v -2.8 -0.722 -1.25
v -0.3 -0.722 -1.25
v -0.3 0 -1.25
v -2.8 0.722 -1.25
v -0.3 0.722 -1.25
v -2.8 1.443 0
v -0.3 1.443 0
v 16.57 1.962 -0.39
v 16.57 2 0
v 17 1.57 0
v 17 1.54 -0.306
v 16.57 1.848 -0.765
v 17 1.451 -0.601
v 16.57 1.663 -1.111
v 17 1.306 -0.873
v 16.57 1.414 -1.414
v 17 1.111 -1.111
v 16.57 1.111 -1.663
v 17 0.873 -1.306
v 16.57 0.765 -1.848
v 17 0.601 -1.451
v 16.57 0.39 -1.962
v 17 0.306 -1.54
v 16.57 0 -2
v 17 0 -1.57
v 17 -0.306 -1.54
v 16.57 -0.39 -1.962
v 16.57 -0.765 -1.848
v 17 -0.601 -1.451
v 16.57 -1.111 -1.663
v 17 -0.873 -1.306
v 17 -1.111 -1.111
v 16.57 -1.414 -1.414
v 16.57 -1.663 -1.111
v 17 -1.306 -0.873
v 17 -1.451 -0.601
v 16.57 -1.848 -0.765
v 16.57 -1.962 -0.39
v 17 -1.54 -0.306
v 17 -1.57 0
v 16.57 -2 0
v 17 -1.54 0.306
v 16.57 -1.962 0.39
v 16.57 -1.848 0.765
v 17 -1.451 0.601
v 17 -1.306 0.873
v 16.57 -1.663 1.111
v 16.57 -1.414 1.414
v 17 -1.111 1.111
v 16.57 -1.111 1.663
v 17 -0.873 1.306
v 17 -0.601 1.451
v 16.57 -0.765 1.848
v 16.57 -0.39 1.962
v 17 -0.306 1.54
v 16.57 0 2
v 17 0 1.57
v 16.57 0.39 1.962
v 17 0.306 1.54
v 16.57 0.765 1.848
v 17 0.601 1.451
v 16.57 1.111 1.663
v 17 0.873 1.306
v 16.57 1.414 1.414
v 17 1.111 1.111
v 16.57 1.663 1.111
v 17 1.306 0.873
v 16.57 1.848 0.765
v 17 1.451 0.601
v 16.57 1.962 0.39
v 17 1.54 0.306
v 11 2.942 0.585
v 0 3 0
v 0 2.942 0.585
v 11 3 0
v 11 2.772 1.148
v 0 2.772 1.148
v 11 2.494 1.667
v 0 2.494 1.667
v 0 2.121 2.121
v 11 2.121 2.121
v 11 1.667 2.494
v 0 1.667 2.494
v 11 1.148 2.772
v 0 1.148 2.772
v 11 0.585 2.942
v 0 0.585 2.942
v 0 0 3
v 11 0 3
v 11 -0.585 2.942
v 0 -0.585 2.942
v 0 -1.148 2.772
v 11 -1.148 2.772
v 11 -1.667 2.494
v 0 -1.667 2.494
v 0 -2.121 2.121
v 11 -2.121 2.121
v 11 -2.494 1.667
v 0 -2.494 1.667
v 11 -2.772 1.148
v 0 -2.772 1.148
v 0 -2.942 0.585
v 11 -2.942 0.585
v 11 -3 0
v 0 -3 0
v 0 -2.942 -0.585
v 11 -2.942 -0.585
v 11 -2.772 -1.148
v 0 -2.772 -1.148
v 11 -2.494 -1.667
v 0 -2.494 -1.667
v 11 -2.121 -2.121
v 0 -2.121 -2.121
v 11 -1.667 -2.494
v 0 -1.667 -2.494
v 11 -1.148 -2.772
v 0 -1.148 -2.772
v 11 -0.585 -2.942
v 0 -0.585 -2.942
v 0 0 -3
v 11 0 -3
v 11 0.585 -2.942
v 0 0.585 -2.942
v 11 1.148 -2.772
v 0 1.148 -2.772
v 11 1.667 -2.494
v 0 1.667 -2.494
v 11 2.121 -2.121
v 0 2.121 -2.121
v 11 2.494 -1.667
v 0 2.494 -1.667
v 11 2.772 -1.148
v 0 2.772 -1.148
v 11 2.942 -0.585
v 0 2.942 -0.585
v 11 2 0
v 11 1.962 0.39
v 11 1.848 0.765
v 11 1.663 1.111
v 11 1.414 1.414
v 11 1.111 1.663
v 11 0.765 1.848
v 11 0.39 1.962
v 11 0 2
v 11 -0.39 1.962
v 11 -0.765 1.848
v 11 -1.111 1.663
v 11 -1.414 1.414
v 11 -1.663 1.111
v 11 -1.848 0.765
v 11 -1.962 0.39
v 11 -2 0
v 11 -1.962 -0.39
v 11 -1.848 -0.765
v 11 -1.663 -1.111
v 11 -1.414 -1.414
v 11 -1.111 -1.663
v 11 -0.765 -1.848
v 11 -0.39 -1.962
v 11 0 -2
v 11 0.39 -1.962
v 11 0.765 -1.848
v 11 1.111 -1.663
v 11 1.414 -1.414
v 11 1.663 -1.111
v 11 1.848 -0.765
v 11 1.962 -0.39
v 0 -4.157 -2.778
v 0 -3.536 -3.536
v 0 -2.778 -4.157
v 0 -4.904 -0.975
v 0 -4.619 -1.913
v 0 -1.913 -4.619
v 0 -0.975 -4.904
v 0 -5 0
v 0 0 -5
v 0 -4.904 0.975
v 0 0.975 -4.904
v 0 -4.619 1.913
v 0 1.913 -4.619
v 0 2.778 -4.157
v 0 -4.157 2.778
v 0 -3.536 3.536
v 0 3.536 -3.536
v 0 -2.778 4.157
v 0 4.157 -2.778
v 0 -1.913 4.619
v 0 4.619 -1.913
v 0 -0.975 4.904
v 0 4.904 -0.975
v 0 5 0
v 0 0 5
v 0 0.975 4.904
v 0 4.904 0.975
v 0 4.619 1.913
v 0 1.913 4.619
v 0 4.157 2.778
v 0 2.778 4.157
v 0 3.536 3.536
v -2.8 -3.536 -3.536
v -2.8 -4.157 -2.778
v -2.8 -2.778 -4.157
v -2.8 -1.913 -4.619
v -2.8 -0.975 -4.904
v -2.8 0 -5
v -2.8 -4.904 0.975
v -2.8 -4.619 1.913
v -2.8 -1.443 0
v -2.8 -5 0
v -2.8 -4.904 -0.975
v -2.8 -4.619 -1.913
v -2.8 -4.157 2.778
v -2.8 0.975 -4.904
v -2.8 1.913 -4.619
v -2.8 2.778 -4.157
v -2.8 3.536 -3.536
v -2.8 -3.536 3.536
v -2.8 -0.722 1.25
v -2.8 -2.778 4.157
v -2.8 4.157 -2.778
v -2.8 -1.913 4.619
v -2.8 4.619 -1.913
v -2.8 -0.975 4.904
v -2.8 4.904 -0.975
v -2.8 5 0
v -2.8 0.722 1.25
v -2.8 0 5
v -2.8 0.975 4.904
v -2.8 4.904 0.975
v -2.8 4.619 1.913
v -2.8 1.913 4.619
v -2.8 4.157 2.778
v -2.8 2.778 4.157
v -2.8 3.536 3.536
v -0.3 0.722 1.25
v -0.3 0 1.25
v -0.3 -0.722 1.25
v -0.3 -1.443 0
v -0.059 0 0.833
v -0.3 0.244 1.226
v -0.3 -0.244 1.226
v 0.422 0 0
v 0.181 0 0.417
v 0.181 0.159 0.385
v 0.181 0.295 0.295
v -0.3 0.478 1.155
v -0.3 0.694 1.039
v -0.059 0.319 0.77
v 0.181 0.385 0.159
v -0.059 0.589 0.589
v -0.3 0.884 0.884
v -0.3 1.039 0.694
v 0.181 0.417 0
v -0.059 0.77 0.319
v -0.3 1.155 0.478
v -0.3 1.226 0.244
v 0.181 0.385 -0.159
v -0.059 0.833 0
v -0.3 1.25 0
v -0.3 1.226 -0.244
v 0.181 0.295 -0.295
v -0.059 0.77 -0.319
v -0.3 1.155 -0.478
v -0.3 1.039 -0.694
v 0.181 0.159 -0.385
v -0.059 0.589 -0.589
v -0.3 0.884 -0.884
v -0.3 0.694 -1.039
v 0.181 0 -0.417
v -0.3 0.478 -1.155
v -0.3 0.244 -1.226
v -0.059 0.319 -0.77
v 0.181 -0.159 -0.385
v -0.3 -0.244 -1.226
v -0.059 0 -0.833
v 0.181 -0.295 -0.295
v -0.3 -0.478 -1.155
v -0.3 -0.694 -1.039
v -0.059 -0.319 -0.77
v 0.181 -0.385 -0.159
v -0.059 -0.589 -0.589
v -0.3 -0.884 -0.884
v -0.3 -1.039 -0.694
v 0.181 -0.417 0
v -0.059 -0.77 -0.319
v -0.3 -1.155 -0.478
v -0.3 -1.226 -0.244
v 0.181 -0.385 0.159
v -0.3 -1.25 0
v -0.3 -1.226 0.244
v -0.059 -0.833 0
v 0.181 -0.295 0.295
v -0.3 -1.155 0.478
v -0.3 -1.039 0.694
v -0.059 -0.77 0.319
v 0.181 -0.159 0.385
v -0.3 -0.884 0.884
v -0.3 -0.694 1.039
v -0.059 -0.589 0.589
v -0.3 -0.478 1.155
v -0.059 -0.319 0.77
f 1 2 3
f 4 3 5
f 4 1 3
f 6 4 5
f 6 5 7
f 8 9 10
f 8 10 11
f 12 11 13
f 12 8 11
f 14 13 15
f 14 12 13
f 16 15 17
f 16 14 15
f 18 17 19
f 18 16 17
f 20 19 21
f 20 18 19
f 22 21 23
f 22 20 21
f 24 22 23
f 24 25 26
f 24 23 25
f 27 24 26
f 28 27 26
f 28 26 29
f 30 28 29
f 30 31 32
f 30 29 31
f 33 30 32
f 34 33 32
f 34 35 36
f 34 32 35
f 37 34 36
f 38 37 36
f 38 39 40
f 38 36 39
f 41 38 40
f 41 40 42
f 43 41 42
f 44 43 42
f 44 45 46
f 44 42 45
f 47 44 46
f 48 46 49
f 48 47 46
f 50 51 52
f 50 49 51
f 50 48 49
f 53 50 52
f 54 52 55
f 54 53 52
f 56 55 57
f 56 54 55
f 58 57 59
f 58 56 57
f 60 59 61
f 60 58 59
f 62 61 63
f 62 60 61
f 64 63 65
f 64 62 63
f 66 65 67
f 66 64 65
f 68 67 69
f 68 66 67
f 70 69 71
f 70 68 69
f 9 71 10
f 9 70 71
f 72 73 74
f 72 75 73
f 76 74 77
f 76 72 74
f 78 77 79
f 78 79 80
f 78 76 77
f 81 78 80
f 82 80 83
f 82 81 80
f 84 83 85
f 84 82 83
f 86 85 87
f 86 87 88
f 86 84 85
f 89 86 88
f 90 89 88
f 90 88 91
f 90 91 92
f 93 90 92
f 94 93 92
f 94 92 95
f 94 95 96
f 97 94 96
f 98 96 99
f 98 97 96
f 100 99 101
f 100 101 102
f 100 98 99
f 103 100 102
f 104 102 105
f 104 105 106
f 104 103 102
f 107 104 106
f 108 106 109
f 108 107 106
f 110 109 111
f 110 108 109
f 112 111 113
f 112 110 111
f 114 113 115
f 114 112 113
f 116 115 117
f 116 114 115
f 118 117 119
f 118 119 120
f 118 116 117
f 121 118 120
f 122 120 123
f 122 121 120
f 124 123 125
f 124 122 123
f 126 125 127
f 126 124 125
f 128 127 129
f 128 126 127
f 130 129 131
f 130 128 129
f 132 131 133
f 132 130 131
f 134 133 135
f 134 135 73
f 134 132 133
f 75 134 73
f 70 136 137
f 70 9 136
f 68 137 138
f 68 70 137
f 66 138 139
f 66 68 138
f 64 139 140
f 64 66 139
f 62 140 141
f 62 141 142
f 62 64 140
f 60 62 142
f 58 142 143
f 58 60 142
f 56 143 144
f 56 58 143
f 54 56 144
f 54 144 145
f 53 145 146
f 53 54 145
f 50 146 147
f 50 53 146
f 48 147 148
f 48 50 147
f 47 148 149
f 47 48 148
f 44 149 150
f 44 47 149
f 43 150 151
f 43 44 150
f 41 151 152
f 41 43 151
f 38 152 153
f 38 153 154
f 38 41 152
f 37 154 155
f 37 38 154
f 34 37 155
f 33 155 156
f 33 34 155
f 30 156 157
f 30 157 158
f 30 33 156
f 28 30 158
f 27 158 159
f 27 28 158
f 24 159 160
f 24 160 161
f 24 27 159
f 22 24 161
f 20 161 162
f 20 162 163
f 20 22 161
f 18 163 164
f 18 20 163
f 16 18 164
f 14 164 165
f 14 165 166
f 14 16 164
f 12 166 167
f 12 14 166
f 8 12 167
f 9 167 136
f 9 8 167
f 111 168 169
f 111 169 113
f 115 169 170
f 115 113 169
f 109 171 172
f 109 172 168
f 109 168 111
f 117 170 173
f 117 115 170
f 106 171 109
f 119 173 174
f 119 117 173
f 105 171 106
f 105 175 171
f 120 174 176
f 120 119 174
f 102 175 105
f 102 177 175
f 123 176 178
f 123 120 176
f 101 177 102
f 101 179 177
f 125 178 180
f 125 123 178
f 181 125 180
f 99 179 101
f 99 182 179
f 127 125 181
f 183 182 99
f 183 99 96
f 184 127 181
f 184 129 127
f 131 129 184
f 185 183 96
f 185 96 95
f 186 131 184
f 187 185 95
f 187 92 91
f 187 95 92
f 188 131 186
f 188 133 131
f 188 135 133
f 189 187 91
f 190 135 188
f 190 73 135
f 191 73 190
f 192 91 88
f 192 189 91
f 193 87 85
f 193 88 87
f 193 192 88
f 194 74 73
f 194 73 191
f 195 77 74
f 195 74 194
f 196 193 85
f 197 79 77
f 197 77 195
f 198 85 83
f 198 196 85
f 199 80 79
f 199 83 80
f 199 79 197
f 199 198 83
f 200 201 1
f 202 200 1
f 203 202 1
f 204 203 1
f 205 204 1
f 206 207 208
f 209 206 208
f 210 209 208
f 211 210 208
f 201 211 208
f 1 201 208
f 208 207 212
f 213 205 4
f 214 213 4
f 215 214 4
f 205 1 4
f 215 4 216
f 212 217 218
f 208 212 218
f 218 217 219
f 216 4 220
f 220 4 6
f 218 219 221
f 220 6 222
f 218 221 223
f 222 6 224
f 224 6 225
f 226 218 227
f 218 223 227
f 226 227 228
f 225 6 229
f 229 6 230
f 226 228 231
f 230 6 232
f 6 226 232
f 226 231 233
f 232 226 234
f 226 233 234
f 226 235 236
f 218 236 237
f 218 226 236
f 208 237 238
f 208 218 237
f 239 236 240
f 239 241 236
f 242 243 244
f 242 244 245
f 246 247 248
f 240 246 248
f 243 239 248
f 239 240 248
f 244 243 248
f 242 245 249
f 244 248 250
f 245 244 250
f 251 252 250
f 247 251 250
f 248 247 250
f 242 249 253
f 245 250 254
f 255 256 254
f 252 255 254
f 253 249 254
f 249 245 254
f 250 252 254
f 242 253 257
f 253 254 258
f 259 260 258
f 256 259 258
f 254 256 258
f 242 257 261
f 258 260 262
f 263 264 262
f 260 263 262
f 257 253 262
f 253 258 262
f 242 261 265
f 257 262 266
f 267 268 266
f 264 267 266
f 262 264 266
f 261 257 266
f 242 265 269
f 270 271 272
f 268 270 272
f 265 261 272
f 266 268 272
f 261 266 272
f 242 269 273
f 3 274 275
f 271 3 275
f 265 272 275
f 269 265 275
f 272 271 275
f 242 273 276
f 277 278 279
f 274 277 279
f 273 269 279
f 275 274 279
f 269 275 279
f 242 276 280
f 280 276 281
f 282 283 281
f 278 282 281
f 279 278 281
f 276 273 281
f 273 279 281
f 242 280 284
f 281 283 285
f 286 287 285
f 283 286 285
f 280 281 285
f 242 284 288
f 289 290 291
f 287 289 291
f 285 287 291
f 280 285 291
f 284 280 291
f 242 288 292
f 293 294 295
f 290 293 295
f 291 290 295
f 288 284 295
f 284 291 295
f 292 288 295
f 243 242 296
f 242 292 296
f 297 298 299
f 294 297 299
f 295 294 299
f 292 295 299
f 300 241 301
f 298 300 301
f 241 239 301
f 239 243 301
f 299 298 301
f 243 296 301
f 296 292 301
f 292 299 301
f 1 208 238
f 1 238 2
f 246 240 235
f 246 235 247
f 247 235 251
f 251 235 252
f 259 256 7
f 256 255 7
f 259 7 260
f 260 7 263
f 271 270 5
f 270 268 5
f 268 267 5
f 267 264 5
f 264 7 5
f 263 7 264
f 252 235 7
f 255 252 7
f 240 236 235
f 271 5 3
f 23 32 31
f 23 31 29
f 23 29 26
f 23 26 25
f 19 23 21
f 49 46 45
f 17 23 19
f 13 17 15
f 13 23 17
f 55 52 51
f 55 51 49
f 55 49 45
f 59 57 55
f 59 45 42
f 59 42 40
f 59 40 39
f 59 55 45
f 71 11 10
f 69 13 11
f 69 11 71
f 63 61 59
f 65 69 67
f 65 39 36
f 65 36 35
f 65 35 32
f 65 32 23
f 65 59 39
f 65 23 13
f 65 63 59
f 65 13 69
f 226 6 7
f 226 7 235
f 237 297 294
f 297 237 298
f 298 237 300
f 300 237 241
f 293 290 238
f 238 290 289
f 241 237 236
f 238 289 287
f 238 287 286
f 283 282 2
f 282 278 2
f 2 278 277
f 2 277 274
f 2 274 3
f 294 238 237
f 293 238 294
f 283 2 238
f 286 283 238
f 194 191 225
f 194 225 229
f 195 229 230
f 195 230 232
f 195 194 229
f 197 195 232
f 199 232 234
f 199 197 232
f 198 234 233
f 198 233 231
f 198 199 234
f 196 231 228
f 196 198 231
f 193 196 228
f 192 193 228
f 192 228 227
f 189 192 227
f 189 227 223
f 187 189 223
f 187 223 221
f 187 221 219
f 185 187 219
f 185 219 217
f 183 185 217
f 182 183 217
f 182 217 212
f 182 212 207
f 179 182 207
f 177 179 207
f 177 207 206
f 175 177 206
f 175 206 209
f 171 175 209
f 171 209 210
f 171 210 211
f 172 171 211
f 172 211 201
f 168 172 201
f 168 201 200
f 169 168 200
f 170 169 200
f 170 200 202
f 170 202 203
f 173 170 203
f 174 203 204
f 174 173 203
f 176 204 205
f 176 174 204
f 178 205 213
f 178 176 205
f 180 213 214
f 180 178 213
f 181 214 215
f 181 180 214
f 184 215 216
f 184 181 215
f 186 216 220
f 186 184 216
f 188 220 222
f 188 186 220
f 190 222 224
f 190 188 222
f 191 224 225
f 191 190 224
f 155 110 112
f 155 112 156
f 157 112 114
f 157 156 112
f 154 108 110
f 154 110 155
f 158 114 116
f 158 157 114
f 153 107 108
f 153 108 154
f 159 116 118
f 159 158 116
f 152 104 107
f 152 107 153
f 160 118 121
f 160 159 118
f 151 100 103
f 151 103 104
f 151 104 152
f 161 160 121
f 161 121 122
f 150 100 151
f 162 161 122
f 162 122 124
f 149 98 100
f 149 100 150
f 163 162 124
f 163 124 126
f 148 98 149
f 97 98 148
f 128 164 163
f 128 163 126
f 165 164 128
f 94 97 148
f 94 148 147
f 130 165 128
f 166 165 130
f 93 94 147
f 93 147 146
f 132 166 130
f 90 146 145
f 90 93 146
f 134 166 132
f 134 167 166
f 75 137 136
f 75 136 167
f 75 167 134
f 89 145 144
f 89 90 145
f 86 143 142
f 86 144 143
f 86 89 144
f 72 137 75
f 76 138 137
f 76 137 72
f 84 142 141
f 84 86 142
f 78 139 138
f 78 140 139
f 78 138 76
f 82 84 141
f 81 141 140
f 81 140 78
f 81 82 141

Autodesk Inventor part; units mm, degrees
ref_plane "YZ Plane" through (0, 0, 0) normal (1, 0, 0) x (0, 1, 0)
ref_plane "XZ Plane" through (0, 0, 0) normal (0, 1, 0) x (-1, 0, 0)
ref_plane "XY Plane" through (0, 0, 0) normal (0, 0, 1) x (1, 0, 0)
sketch "Sketch_1" plane through (0, 0, 0) normal (0, 0, 1) x (1, 0, 0)
  line L0 (11, 0) -> (-2.8, 0)
  line L1 (-2.8, 0) -> (-2.8, 5)
  line L2 (-2.8, 5) -> (0, 5)
  line L3 (0, 5) -> (0, 3)
  line L4 (0, 3) -> (11, 3)
  line L5 (11, 3) -> (11, 0)
  line L6 (11, 0) -> (-2.8, 0)
revolve "Revolution1" add sketch "Sketch_1" angle 360 about axis through (11, 0, 0) along (1, 0, 0)
sketch "Sketch2" plane through (-2.8, 0, 0) normal (-1, 0, 0) x (0, 0, 1)
  point P0 (0, 0)
hole "Hole1" at (-2.8, 0, 0) direction (1, 0, 0) diameter 2.5 depth 2.5 tip angle 120
sketch "Sketch_3" plane through (-2.8, 0, 0) normal (1, 0, 0) x (0, 0, -1)
  line L0 (-1.25, -0.7217) -> (0, -1.4434)
  line L1 (0, -1.4434) -> (1.25, -0.7217)
  line L2 (1.25, -0.7217) -> (1.25, 0.7217)
  line L3 (1.25, 0.7217) -> (0, 1.4434)
  line L4 (0, 1.4434) -> (-1.25, 0.7217)
  line L5 (-1.25, 0.7217) -> (-1.25, -0.7217)
extrude "Extrusion1" cut sketch "Sketch_3" along normal blind 2.5
sketch "Sketch_6" plane through (0, 0, 0) normal (0, 0, 1) x (1, 0, 0)
  line L0 (17, 0) -> (11, 0)
  line L1 (11, 0) -> (11, 2)
  line L2 (11, 2) -> (16.5705, 2)
  line L3 (16.5705, 2) -> (17, 1.5705)
  line L4 (17, 1.5705) -> (17, 0)
  line L5 (17, 0) -> (11, 0)
revolve "Revolution2" add sketch "Sketch_6" angle 360 about axis through (17, 0, 0) along (1, 0, 0)
thread "Thread1" size "M4x0.7" class "6g" standard "ISO Metric profile" length 4.3705
properties part number "DBTS4-11-6"
